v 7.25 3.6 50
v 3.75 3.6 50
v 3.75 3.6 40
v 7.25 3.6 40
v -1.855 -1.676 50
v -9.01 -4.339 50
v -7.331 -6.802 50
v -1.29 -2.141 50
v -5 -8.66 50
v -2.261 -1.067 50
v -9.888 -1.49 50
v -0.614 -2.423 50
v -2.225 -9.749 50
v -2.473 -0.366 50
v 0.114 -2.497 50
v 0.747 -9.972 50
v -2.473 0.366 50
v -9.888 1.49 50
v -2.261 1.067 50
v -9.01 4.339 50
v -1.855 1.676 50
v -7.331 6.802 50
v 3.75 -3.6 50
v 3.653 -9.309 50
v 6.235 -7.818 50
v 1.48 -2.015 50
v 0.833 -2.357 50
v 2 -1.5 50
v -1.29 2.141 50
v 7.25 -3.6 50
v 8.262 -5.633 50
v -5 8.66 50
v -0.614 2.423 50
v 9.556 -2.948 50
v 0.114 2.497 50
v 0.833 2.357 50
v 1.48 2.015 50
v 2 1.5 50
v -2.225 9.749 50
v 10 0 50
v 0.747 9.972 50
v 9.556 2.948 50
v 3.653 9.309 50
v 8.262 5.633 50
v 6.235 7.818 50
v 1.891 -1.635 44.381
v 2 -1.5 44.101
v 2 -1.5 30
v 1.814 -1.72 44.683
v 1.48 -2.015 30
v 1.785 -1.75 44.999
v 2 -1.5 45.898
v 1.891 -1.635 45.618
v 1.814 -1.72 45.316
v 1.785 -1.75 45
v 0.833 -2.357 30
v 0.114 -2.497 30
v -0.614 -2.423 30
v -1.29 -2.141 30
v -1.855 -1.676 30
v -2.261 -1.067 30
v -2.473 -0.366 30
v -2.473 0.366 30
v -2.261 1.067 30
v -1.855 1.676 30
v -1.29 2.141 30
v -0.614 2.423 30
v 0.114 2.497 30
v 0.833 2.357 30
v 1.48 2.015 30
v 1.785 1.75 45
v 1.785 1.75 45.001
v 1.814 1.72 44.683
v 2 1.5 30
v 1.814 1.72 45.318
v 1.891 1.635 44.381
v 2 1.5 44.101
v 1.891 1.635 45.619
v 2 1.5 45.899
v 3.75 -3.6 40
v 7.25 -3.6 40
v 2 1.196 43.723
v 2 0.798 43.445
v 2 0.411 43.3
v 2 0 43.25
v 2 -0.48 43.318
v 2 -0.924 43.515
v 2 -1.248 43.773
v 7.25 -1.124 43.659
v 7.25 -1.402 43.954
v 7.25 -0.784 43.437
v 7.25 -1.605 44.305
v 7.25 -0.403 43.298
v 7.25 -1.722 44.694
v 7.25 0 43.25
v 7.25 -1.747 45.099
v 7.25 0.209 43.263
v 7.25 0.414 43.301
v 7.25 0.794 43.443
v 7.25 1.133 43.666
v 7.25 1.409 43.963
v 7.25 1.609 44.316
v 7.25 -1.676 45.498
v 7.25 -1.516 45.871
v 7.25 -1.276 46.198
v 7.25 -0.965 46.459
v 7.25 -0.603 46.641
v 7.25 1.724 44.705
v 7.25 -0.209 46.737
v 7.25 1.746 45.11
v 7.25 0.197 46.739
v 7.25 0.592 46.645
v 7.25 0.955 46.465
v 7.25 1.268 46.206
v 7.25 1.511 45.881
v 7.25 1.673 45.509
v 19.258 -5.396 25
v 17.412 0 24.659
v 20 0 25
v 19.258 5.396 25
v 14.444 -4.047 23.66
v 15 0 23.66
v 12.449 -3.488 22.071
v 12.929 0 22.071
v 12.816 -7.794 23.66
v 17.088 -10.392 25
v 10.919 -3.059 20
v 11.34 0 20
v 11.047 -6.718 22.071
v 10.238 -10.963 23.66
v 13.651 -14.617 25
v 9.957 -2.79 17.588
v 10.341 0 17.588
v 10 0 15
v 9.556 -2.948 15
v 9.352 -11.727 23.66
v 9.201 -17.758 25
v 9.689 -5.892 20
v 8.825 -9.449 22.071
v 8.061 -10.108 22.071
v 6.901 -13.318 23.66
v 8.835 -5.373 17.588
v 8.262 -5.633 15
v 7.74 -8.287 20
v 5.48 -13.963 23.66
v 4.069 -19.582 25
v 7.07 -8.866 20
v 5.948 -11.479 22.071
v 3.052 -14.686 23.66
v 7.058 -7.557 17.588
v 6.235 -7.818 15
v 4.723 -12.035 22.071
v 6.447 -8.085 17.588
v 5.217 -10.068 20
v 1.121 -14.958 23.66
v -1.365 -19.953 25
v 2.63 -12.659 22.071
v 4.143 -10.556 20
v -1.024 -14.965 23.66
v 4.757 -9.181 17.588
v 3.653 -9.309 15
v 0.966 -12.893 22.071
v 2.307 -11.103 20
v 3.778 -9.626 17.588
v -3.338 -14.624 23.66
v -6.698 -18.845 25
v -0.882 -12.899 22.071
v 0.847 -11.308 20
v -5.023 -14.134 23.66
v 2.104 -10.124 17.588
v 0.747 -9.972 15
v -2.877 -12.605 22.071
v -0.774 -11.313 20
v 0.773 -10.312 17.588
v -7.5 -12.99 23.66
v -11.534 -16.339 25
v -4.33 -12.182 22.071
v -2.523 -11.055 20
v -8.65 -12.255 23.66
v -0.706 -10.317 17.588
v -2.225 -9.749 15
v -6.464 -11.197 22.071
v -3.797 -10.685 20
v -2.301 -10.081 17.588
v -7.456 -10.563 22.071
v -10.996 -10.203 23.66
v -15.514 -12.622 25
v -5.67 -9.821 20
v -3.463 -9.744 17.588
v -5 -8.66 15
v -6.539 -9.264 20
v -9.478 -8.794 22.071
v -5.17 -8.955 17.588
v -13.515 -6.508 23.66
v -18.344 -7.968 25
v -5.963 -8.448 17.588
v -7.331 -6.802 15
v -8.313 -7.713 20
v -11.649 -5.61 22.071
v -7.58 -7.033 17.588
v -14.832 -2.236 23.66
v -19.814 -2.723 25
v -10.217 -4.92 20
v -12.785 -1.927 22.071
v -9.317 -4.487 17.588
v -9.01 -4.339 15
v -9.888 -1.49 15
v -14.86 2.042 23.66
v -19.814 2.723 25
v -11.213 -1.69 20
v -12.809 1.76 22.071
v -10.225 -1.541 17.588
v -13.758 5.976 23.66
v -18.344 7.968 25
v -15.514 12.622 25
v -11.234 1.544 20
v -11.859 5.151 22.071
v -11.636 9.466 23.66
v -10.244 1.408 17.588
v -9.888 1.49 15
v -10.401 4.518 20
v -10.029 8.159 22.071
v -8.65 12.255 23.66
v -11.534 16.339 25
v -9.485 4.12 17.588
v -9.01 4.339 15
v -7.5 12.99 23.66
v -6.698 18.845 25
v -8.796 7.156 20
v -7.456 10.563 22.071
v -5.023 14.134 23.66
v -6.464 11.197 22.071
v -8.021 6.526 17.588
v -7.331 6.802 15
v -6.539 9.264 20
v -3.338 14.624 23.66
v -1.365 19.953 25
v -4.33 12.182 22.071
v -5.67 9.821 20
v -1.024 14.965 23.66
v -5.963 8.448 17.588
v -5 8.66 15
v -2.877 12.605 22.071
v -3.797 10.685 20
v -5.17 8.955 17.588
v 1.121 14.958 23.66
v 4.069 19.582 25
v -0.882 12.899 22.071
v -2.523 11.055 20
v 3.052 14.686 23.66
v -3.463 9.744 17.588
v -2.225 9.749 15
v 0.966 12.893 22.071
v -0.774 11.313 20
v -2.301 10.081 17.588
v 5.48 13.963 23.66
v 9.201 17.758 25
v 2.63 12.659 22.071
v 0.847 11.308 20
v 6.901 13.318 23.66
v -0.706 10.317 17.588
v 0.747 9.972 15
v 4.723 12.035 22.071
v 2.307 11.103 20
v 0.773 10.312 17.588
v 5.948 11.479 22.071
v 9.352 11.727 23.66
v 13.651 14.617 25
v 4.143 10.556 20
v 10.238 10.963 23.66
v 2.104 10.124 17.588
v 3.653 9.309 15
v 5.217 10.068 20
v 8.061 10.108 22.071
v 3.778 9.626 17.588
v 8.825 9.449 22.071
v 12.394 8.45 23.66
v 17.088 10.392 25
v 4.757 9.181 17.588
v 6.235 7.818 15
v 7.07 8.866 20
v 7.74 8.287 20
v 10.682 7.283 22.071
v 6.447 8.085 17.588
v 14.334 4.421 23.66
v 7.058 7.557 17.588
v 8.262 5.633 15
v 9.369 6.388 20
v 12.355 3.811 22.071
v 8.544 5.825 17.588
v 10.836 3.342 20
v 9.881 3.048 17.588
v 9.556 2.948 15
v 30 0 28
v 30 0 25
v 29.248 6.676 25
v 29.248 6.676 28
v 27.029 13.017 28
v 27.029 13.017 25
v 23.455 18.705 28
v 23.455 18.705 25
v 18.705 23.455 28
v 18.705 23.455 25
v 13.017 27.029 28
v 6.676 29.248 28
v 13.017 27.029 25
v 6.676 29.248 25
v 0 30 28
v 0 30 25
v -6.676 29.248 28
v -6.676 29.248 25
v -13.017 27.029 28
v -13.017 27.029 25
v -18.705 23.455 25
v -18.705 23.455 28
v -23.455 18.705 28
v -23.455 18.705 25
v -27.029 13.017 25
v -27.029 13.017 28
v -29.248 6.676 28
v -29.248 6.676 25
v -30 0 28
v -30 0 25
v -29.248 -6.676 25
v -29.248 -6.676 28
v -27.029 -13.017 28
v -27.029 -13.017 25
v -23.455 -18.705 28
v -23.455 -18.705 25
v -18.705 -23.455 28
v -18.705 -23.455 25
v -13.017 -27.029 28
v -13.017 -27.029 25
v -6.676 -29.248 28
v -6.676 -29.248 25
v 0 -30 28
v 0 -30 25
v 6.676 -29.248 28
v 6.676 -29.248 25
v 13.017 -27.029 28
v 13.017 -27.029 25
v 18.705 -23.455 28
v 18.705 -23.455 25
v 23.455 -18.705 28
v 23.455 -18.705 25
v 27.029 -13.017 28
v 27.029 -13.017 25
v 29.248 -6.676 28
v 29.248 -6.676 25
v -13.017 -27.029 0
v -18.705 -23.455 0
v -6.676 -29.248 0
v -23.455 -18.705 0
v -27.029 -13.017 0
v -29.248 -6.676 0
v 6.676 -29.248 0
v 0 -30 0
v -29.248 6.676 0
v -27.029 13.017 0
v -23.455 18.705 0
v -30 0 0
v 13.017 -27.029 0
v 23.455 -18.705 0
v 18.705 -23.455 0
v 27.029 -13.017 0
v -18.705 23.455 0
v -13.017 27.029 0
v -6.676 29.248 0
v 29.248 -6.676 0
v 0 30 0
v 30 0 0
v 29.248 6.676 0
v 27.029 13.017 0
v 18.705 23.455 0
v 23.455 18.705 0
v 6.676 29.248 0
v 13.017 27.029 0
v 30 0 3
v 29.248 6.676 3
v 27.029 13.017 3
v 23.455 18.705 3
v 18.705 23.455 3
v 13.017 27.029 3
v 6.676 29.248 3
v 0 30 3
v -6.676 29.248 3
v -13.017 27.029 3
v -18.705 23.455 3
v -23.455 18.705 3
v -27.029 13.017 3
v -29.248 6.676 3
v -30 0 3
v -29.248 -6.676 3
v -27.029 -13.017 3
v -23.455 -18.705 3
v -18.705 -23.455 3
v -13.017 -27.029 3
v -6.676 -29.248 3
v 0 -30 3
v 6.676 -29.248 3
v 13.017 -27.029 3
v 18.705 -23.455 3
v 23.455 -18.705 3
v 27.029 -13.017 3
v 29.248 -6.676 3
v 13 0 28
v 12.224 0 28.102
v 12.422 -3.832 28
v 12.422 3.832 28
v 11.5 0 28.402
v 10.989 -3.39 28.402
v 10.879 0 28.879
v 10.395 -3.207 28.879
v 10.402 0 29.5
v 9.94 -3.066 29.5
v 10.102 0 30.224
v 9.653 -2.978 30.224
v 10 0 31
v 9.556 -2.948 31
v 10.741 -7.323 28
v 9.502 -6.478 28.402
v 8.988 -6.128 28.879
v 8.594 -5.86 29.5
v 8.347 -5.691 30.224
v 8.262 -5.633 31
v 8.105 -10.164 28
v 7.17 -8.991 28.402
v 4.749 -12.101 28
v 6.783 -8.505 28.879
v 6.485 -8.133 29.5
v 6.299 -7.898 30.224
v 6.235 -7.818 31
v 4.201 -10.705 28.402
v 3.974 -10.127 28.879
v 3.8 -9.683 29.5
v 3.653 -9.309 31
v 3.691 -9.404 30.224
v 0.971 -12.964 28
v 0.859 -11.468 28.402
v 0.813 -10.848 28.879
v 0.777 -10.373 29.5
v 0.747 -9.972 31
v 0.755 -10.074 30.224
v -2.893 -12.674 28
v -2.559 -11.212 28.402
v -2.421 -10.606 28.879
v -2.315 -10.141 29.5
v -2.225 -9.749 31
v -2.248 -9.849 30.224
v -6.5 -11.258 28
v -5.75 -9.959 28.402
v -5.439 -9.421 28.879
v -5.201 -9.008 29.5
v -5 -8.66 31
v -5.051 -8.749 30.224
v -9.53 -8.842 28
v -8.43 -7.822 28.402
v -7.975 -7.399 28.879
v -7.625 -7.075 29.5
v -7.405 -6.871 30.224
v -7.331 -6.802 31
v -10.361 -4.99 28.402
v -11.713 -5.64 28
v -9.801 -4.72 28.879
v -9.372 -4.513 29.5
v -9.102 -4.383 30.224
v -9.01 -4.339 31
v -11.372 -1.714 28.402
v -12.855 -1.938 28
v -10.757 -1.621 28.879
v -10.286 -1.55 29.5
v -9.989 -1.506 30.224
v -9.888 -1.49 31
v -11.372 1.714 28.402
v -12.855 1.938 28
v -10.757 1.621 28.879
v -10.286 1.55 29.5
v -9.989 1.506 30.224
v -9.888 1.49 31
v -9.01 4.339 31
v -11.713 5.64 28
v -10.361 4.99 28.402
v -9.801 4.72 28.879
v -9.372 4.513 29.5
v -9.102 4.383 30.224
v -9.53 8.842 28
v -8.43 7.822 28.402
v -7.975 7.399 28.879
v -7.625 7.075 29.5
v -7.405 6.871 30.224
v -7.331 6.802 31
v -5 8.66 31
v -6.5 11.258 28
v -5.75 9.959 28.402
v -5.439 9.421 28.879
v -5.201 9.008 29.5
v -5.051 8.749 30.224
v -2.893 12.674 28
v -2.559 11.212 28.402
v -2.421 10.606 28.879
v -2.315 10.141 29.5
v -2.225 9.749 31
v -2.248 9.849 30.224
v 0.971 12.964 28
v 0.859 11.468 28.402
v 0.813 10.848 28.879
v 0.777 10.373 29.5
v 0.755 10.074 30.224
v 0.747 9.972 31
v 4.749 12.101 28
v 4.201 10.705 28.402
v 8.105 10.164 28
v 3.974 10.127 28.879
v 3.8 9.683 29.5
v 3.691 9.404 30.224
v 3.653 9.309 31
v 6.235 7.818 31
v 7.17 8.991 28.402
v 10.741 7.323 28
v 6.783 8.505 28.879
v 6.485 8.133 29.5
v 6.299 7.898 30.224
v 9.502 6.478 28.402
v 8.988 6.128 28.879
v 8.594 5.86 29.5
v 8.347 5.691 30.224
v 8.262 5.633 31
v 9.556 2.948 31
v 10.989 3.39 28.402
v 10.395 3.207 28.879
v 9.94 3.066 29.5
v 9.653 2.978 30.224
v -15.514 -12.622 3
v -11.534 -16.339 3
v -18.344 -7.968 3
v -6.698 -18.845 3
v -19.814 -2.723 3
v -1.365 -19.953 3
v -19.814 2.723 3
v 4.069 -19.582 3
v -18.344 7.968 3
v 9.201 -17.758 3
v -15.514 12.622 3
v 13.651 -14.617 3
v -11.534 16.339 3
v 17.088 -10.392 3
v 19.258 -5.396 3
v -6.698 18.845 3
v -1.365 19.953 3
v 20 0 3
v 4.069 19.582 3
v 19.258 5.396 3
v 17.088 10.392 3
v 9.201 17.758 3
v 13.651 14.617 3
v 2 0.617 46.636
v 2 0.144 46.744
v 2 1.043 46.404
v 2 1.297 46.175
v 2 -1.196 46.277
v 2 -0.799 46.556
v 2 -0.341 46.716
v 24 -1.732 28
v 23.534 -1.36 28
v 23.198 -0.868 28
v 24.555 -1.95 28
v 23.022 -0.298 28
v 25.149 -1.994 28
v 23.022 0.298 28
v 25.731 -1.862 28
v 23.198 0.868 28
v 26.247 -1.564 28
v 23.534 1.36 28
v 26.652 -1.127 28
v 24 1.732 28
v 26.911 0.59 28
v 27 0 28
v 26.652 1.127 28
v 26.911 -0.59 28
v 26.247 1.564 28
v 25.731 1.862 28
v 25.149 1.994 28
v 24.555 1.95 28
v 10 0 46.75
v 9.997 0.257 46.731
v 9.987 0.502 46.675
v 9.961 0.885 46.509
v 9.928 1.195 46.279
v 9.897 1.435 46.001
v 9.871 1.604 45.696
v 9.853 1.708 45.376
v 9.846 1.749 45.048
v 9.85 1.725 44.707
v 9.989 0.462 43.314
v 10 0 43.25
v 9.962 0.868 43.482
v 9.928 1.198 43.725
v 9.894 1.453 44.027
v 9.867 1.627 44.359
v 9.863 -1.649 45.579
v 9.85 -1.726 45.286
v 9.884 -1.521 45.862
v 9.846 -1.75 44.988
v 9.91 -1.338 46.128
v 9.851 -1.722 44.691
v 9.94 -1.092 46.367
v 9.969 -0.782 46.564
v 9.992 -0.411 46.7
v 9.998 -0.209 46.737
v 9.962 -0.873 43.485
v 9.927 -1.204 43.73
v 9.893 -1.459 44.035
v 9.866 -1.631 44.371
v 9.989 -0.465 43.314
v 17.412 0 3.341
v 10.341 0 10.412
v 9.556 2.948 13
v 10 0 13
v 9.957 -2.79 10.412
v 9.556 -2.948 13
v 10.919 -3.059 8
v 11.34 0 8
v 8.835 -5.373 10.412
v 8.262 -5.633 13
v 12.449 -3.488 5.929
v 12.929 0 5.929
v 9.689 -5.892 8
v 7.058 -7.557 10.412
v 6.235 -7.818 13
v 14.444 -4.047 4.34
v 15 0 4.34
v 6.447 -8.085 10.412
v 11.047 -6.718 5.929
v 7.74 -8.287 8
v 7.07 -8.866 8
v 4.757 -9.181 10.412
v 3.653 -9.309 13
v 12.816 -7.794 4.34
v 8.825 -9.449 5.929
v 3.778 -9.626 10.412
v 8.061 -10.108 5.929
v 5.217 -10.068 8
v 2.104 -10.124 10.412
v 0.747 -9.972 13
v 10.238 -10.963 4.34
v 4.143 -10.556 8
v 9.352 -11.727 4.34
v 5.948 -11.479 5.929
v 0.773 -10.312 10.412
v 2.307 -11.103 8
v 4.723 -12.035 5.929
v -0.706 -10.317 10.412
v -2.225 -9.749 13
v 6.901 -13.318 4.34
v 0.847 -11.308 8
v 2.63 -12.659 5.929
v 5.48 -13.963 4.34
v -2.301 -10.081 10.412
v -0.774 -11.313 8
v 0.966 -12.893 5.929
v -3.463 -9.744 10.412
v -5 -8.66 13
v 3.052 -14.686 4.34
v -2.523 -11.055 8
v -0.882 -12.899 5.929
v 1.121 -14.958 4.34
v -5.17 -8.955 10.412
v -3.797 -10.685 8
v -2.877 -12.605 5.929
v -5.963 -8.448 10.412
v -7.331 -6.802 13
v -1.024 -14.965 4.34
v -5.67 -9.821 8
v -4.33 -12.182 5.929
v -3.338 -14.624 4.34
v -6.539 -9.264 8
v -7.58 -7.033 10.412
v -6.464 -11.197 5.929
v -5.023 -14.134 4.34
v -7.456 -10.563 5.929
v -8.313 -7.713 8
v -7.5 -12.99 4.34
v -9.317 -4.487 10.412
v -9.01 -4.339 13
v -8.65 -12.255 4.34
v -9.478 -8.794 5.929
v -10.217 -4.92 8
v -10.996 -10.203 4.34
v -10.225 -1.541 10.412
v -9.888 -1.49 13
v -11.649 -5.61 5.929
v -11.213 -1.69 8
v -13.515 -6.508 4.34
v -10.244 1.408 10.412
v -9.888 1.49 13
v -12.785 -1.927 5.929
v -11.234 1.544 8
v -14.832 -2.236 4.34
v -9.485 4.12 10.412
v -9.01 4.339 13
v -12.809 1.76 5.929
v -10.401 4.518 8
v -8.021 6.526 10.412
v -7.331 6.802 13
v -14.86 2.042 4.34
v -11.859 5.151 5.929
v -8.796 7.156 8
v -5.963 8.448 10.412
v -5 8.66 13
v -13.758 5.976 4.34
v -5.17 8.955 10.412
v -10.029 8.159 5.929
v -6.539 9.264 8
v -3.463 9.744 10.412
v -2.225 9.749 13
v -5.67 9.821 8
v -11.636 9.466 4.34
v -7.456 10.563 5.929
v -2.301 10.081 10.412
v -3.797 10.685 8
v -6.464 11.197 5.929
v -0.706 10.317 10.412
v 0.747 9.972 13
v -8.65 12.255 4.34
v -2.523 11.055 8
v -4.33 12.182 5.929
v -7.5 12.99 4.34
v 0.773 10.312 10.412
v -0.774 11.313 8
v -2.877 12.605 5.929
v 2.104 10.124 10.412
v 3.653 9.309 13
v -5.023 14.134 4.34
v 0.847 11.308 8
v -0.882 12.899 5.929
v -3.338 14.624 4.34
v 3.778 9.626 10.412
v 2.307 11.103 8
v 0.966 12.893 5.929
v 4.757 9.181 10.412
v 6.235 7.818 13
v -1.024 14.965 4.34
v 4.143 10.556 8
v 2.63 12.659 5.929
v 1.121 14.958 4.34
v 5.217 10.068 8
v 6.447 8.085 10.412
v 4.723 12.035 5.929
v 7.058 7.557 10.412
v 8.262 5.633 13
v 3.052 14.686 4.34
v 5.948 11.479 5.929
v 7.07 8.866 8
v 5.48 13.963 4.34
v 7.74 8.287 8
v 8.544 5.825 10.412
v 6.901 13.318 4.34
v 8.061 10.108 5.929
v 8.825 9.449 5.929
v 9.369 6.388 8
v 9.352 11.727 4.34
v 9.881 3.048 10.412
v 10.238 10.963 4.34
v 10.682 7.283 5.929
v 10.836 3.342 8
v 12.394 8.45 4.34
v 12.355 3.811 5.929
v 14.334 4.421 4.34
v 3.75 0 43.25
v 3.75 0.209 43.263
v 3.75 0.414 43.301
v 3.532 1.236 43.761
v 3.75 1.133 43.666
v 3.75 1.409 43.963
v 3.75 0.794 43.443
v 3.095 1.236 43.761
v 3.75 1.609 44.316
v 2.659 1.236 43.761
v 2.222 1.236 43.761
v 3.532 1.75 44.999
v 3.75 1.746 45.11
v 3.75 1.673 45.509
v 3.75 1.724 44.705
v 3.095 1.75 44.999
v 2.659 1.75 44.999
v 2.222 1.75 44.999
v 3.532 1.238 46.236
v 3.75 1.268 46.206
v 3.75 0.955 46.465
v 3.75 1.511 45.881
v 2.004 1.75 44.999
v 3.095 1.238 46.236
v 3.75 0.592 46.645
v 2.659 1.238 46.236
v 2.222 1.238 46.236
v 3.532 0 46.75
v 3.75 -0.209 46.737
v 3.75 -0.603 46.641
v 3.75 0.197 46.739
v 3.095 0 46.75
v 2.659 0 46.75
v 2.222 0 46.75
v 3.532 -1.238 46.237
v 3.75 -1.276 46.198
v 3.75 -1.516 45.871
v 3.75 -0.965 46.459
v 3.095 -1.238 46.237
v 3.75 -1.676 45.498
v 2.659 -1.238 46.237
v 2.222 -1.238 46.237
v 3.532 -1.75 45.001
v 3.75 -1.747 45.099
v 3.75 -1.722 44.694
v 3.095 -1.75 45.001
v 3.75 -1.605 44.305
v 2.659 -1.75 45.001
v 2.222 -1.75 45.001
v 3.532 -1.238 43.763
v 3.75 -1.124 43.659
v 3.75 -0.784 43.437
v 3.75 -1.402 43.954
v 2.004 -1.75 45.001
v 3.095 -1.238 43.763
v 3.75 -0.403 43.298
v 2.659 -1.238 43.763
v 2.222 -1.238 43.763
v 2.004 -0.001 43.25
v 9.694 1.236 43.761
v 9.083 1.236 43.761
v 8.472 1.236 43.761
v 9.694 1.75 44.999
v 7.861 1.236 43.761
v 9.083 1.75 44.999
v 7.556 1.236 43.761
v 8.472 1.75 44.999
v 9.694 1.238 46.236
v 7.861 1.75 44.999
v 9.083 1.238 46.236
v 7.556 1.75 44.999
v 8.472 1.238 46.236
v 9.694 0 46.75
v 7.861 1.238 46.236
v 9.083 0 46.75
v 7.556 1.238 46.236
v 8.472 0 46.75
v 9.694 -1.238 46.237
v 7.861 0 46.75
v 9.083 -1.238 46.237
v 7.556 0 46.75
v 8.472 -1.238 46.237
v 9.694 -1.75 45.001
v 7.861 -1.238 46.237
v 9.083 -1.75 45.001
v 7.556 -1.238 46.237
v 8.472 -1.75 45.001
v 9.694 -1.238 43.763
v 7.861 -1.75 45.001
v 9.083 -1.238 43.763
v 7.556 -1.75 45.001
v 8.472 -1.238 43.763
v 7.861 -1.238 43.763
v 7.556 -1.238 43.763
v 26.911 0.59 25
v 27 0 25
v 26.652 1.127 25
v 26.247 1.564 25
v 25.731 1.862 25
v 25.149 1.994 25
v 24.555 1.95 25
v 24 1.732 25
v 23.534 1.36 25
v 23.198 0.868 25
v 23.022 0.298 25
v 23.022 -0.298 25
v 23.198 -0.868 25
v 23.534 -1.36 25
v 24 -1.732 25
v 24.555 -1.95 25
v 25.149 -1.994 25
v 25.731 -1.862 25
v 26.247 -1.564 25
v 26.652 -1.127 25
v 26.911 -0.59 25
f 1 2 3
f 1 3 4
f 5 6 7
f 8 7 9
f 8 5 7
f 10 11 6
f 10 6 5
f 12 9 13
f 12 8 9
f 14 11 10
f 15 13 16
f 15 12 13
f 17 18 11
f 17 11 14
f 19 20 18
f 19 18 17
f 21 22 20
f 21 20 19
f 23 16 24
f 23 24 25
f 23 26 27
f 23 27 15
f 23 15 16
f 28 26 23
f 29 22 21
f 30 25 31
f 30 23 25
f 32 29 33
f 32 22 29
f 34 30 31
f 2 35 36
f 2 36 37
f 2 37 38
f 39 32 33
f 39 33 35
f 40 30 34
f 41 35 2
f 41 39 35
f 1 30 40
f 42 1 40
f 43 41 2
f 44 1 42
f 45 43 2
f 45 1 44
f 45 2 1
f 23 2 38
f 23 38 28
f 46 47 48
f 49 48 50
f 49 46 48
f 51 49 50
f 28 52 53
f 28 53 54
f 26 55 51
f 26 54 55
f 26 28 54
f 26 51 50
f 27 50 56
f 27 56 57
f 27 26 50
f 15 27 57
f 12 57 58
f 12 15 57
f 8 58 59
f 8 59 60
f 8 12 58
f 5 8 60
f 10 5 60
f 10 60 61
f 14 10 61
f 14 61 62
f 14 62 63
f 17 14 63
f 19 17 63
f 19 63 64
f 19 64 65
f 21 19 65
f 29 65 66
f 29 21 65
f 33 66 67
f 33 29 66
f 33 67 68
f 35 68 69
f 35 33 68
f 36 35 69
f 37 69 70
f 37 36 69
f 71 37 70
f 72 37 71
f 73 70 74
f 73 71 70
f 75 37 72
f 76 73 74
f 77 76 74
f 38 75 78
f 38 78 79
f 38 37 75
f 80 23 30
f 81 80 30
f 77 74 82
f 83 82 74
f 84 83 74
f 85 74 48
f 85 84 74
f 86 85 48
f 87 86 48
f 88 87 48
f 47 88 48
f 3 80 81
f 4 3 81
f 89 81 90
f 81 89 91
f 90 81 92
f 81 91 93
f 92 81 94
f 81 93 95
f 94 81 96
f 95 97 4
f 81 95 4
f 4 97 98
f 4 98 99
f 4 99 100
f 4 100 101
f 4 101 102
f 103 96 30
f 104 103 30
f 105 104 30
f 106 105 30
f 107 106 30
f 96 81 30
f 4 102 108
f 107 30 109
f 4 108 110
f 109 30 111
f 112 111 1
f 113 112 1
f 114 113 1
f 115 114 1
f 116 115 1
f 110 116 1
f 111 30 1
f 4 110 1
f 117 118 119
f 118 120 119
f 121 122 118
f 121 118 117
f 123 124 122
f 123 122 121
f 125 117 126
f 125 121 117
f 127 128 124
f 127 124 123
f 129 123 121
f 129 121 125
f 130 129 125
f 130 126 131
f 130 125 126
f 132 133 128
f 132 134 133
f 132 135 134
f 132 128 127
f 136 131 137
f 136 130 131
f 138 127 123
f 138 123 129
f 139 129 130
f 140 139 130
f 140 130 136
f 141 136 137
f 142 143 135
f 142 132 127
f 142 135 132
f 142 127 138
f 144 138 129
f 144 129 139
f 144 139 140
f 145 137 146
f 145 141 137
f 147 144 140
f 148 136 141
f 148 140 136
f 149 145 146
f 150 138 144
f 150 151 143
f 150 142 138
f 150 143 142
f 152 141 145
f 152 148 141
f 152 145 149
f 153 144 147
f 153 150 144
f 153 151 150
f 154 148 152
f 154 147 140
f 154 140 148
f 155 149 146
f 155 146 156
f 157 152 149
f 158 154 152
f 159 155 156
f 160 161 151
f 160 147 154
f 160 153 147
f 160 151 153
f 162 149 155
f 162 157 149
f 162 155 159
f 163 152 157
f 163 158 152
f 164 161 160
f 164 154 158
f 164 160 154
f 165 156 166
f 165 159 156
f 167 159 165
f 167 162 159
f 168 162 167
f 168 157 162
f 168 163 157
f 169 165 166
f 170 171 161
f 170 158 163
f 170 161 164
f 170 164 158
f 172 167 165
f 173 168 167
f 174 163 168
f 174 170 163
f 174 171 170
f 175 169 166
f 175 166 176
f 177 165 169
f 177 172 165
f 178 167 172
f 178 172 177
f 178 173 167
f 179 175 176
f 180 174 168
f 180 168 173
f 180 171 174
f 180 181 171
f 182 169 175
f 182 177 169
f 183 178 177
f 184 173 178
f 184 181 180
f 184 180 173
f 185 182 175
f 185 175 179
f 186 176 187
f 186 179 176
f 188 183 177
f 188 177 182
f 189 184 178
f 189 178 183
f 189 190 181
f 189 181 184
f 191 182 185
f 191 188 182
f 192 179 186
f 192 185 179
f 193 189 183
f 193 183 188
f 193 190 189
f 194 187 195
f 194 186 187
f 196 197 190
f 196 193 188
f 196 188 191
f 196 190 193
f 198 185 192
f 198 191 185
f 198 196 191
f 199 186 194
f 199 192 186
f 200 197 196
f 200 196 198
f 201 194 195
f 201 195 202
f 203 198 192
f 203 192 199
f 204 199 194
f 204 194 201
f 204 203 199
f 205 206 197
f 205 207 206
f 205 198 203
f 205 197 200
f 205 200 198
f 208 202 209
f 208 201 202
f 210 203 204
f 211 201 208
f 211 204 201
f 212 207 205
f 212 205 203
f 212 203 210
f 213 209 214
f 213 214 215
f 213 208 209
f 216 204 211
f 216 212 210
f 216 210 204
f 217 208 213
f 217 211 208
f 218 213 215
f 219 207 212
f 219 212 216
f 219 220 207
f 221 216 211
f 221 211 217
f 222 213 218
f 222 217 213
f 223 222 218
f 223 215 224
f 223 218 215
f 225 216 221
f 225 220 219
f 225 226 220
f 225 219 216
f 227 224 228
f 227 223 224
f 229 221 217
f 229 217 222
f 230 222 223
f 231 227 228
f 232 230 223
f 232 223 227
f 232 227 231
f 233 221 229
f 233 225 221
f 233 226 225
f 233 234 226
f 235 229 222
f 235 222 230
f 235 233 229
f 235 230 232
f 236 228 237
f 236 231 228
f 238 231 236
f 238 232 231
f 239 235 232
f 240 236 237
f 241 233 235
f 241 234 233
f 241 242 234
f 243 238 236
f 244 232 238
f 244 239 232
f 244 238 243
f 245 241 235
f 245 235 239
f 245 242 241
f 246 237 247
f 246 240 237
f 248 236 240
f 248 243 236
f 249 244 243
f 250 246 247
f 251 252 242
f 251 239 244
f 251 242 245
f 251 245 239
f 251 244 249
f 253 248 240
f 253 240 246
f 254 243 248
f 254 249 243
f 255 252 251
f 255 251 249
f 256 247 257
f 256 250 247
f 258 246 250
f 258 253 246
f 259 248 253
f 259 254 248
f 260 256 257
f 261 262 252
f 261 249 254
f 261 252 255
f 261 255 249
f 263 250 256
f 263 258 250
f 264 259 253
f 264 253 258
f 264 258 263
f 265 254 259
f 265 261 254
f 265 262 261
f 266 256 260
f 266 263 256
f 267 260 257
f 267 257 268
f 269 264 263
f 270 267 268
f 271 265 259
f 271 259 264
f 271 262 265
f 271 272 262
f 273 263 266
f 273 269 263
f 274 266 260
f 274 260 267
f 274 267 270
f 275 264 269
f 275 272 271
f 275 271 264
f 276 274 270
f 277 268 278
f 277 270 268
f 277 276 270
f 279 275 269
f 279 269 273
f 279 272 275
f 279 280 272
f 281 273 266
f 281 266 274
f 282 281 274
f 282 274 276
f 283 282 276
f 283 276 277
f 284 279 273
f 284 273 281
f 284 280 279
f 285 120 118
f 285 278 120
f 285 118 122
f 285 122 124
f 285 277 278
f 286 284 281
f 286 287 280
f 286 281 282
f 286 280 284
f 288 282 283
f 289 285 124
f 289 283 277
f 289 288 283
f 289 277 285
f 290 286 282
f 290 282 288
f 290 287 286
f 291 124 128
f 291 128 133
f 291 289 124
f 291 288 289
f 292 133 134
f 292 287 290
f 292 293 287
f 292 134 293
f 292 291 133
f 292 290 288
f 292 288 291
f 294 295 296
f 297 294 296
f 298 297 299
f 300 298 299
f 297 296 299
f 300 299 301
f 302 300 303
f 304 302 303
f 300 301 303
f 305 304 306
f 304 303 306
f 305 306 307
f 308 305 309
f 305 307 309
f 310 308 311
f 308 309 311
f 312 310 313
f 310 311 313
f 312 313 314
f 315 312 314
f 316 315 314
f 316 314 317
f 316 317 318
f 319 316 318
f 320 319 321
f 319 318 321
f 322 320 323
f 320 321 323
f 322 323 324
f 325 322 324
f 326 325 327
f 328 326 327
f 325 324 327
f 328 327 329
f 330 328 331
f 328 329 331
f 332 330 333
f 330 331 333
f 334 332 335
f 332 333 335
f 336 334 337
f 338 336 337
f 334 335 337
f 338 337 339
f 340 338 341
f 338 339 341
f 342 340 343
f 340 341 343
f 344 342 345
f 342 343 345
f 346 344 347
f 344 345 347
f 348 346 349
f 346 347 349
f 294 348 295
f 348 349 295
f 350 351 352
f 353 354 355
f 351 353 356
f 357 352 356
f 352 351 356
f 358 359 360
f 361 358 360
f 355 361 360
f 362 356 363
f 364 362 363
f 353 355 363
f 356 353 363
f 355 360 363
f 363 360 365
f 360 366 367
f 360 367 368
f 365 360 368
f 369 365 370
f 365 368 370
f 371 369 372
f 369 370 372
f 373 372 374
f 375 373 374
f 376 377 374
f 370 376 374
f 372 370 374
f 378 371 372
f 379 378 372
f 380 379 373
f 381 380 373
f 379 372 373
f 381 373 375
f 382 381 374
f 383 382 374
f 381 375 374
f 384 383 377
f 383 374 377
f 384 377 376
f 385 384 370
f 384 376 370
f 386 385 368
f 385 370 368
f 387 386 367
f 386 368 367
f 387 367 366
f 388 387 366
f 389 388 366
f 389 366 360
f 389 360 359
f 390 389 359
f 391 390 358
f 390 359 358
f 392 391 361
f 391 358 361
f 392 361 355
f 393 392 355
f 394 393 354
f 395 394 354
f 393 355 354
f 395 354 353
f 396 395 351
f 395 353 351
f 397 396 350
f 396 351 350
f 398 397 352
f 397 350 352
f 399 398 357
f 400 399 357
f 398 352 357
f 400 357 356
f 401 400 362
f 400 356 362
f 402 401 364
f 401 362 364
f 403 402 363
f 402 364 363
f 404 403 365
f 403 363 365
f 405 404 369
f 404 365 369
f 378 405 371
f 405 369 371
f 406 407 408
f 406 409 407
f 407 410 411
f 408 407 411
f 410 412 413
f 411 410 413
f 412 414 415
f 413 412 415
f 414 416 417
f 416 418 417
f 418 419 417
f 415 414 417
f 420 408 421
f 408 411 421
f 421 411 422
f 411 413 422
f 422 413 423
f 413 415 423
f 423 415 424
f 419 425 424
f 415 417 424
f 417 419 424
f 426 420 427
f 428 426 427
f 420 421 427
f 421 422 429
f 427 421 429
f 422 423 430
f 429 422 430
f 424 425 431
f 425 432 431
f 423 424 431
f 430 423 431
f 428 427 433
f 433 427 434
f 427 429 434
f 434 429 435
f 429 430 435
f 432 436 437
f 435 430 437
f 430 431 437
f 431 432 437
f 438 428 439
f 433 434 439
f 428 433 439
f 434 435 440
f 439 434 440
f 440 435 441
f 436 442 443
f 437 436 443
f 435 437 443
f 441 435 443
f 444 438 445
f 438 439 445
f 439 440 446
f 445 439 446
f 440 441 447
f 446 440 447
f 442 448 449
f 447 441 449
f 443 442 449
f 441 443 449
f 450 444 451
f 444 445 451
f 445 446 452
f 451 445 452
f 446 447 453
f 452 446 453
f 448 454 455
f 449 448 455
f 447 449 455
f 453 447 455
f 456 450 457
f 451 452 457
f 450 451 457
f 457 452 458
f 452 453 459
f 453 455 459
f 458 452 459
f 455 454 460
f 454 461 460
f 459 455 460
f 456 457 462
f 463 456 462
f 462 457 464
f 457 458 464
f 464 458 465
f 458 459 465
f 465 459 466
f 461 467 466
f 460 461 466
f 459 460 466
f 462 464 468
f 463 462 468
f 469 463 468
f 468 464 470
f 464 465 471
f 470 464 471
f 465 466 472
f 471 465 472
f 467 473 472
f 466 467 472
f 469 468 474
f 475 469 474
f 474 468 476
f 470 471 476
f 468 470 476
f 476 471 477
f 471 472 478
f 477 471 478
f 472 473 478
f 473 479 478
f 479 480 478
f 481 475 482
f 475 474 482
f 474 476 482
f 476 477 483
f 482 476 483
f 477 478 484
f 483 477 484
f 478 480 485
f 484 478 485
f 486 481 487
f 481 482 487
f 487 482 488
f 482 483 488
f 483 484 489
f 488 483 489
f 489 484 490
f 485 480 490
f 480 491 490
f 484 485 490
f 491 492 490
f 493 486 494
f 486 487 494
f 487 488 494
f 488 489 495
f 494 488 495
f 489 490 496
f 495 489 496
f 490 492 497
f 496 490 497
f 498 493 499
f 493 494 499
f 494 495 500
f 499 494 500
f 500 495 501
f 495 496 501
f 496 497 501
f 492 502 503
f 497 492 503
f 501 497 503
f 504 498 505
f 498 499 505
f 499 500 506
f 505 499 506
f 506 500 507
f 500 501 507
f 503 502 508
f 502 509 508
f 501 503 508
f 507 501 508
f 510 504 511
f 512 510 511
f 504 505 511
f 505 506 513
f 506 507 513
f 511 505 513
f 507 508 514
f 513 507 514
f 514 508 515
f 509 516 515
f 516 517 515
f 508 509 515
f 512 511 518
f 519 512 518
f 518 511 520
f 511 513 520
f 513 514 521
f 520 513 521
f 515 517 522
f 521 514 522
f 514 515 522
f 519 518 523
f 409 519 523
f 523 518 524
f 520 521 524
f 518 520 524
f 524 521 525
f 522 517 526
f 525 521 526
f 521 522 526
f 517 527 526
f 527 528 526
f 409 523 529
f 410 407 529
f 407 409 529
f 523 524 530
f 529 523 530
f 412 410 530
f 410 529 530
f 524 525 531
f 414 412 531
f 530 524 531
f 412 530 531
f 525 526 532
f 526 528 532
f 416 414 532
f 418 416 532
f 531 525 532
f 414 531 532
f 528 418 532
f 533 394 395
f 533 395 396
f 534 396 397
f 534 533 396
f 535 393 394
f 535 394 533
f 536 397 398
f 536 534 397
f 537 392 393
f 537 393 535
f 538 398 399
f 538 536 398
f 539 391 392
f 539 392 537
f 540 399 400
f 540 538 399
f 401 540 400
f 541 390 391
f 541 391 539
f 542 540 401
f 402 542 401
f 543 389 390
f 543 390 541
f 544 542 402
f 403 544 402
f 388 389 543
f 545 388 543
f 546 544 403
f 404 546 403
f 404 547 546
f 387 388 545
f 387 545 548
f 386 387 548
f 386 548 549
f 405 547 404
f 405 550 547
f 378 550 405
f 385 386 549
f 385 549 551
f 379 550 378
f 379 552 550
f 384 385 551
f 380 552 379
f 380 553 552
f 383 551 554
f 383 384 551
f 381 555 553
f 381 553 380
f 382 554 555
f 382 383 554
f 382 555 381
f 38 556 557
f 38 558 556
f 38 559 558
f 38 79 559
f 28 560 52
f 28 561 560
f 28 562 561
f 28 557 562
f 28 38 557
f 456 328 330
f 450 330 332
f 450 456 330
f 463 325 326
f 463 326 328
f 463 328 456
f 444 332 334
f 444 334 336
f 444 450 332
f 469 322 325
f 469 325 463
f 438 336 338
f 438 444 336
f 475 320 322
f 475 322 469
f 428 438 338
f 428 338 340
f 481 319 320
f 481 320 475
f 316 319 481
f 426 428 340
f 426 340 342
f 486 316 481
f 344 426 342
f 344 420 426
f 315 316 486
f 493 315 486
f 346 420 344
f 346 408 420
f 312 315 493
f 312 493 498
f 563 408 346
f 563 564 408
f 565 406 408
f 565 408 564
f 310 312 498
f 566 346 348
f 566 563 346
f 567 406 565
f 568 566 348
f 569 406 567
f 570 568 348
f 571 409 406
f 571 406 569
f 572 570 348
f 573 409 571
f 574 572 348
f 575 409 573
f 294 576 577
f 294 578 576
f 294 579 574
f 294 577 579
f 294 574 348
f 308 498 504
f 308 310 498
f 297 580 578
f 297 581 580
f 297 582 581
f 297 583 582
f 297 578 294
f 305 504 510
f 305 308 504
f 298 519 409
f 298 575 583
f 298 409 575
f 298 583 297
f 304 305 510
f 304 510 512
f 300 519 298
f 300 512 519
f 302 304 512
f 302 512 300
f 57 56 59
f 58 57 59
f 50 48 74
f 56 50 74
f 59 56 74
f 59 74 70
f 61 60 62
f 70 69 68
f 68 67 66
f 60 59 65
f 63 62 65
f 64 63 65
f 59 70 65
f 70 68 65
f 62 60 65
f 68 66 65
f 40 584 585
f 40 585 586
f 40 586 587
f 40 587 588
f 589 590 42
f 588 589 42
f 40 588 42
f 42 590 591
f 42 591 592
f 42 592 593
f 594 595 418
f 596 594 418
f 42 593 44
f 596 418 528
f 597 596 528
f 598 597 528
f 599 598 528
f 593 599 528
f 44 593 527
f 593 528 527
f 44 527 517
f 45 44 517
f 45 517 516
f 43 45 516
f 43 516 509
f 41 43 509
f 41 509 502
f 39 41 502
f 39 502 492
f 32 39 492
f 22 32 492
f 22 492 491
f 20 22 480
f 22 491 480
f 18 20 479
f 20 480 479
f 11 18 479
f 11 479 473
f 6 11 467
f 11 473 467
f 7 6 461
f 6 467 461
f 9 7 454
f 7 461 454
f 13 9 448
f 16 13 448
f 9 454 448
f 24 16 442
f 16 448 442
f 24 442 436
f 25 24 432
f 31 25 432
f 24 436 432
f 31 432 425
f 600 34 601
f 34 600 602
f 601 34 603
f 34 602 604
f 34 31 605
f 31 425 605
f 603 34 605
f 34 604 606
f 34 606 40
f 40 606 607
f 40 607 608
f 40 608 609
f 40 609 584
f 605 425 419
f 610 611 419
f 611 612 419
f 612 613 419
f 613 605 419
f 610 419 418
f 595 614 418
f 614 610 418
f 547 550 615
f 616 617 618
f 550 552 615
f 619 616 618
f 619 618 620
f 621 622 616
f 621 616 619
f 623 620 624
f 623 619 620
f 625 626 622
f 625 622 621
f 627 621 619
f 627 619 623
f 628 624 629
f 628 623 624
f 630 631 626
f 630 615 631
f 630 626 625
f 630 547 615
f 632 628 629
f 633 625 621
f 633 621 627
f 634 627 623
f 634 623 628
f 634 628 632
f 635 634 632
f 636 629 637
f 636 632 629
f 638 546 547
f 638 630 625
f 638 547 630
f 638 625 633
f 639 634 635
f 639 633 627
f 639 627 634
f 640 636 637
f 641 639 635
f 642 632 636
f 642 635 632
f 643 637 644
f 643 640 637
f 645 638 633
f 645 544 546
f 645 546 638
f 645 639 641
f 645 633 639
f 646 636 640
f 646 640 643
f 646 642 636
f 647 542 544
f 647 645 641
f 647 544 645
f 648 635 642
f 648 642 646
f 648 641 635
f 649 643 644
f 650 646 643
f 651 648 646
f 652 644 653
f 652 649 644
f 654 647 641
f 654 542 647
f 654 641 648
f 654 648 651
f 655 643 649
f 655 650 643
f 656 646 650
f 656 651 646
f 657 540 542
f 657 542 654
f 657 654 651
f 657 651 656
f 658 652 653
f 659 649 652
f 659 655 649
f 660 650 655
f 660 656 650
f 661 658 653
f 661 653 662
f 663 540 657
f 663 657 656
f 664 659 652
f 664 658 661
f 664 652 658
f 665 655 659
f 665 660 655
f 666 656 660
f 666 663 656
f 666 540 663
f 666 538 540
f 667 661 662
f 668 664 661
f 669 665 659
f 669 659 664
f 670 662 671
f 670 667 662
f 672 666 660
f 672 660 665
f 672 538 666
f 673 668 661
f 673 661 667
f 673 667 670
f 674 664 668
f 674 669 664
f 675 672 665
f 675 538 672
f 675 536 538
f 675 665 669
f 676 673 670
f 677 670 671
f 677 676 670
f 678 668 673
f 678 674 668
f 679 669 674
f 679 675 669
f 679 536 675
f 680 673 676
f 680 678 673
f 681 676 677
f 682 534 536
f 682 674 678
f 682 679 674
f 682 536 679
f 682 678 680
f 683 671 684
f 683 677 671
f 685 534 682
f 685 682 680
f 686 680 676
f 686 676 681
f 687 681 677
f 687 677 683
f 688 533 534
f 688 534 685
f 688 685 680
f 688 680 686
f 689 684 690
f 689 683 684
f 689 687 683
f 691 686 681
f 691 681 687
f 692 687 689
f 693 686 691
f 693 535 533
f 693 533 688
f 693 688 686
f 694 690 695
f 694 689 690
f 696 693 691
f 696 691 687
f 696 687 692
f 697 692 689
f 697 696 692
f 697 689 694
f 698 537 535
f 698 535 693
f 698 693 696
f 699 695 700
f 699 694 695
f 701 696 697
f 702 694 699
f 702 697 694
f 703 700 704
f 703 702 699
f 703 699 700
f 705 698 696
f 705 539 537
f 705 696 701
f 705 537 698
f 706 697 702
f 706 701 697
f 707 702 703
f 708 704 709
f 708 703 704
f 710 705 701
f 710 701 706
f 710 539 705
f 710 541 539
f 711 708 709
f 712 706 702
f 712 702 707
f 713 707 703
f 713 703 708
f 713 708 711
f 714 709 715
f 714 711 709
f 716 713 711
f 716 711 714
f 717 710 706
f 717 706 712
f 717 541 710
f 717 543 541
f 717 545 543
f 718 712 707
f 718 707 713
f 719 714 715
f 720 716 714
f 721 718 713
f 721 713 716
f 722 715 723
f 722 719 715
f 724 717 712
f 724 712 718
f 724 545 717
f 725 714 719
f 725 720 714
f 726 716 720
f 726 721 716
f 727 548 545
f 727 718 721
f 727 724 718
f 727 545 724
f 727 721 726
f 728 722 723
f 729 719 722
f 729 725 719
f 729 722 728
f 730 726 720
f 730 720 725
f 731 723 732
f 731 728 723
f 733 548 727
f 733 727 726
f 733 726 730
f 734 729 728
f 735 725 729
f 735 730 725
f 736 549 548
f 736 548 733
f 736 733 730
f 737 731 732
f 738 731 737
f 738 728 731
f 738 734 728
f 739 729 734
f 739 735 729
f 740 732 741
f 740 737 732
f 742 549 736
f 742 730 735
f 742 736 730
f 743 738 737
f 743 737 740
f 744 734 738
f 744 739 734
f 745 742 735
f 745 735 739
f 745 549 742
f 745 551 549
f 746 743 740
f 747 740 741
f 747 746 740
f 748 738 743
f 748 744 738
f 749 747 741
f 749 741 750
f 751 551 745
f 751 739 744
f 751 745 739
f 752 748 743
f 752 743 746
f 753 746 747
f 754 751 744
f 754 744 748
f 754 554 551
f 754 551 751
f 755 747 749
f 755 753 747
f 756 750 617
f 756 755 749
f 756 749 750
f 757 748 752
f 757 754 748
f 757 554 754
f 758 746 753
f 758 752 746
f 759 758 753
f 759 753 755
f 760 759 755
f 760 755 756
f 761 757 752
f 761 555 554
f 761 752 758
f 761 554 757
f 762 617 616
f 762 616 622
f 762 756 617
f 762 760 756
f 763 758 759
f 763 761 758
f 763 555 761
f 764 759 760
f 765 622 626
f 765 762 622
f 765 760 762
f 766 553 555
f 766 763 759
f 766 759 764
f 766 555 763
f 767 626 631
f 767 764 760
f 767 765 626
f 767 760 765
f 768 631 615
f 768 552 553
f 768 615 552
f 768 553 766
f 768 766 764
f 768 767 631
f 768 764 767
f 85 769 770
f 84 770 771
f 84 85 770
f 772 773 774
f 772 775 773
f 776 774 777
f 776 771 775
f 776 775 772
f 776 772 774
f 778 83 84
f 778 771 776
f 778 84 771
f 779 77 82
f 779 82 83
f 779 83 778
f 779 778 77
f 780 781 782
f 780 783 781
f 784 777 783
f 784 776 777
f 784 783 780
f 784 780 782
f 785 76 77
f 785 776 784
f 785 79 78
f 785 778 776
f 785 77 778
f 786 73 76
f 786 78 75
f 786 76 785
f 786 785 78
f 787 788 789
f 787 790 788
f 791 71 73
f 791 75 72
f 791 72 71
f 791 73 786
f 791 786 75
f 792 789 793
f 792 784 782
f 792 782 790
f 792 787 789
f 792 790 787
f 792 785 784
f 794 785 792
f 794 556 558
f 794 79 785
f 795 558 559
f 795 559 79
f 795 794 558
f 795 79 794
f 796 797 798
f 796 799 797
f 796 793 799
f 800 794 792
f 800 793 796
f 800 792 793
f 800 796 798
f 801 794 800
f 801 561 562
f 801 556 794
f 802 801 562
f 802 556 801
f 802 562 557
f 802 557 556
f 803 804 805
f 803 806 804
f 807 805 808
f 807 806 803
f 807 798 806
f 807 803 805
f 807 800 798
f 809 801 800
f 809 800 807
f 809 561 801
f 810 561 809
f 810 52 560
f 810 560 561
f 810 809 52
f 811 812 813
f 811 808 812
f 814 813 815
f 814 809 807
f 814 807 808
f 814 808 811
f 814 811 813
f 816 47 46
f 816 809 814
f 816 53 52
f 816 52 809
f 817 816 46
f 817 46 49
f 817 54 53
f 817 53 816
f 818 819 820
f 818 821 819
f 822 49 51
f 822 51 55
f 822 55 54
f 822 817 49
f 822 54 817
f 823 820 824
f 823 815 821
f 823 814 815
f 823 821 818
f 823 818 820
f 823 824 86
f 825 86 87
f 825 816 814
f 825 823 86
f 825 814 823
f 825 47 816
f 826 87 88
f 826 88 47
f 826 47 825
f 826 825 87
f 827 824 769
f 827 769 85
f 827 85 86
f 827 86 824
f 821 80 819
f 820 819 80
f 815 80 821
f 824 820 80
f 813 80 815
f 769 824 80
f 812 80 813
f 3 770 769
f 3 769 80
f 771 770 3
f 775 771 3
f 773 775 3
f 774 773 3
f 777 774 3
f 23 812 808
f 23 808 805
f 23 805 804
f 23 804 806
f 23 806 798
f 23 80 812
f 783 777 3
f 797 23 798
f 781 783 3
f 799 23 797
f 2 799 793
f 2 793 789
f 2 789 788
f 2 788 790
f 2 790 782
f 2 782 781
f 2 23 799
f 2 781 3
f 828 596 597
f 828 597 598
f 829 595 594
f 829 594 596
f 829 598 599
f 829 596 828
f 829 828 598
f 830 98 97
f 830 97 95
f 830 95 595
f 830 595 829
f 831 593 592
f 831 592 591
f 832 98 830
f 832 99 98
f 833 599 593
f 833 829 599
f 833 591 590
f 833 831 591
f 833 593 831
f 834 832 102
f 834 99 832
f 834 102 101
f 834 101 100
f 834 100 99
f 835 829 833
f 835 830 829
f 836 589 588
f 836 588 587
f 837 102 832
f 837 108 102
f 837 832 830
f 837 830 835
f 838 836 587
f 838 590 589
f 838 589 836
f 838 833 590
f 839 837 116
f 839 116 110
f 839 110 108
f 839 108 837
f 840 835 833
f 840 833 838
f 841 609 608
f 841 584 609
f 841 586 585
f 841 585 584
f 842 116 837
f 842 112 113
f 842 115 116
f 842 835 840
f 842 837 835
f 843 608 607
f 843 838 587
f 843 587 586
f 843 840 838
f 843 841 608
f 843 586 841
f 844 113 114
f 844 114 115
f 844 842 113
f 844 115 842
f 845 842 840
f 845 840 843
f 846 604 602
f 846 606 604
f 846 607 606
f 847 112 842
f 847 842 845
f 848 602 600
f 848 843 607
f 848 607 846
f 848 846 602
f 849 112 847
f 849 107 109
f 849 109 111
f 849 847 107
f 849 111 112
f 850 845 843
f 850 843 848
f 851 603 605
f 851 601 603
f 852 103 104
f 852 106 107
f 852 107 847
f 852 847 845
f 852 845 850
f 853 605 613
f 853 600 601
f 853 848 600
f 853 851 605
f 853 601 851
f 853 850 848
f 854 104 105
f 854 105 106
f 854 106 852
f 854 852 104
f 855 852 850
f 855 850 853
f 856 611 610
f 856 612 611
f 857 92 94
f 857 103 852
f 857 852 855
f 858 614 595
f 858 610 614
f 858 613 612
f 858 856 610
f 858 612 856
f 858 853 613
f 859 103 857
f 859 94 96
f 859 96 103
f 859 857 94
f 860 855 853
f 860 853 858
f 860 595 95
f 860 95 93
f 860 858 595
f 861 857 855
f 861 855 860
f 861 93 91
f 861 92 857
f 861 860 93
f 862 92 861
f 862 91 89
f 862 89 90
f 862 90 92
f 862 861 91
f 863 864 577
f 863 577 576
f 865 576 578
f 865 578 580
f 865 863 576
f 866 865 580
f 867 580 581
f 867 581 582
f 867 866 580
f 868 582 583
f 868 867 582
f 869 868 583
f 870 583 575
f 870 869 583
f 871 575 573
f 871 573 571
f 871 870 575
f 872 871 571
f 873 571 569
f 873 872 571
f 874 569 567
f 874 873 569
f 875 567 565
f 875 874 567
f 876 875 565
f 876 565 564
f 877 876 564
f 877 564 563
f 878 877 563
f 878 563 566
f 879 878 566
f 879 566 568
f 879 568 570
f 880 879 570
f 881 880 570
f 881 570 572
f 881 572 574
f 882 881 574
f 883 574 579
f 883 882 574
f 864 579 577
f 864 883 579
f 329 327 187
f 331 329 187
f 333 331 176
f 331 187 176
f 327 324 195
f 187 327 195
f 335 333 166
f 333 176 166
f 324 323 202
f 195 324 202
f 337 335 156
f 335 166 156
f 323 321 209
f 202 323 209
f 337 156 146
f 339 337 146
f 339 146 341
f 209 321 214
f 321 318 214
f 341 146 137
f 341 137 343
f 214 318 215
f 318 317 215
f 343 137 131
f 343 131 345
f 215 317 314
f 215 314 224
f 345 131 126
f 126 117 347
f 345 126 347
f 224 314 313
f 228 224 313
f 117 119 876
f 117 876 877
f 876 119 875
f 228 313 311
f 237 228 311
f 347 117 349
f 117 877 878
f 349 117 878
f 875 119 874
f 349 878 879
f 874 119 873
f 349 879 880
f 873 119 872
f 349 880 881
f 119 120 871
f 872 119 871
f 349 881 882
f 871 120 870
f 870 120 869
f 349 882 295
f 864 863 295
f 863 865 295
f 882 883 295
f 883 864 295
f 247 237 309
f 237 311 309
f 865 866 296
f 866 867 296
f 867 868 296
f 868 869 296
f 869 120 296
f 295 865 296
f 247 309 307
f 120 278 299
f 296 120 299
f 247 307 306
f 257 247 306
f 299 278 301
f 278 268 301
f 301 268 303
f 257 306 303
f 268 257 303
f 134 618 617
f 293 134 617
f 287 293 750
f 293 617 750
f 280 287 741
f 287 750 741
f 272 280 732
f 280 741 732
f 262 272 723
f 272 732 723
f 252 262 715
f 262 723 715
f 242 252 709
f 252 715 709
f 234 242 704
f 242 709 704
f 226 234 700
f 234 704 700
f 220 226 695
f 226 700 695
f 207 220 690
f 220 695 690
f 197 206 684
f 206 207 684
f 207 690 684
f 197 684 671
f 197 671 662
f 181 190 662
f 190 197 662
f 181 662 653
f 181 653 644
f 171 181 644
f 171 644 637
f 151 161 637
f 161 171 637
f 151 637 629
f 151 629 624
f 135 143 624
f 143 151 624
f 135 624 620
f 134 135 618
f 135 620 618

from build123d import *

# Parameters (mm, degrees)
CROQUIS1_R              = 10
SALIENTE_EXTRUIR2_DEPTH = 50
CROQUIS4_R              = 30
SALIENTE_EXTRUIR3_DEPTH = 3
SALIENTE_EXTRUIR4_START = 25
CROQUIS5_R              = 30
SALIENTE_EXTRUIR4_DEPTH = 3
REDONDEO2_R             = 10
CORTAR_EXTRUIR1_START   = 50
CORTAR_EXTRUIR1_DEPTH   = 20
CORTAR_EXTRUIR2_START   = 50
CROQUIS7_W              = 3.5
CROQUIS7_H              = 7.2
CORTAR_EXTRUIR2_DEPTH   = 10
CORTAR_EXTRUIR3_START   = 1.785357468
CORTAR_EXTRUIR3_DEPTH   = 8.214642632
CORTAR_EXTRUIR4_START   = 25
CROQUIS9_R              = 2
CORTAR_EXTRUIR4_DEPTH   = 3
REDONDEO3_R             = 3


# Read off the part's stored shape, not the designer's step: Cortar-Extruir3
with BuildPart() as part:
    # Croquis1 → Saliente-Extruir2 (new body)
    with BuildSketch(Plane.XY):
        Circle(CROQUIS1_R)
    extrude(amount=SALIENTE_EXTRUIR2_DEPTH)

    # Croquis4 → Saliente-Extruir3 (add)
    with BuildSketch(Plane.XY):
        Circle(CROQUIS4_R)
    extrude(amount=SALIENTE_EXTRUIR3_DEPTH)

    # Croquis5 → Saliente-Extruir4 (add)
    with BuildSketch(Plane.XY.offset(SALIENTE_EXTRUIR4_START)):
        Circle(CROQUIS5_R)
    extrude(amount=SALIENTE_EXTRUIR4_DEPTH)

    # Redondeo2
    redondeo2_edges = [part.edges().sort_by_distance(p)[0] for p in [
        (-10, 0, 25),
        (-10, 0, 3),
    ]]
    fillet(redondeo2_edges, radius=REDONDEO2_R)

    # Croquis6 → Cortar-Extruir1 (cut)
    with BuildSketch(Plane.XY.offset(CORTAR_EXTRUIR1_START)):
        with BuildLine():
            Line((2, 1.5), (2, -1.5))
            ThreePointArc((2, -1.5), (-2.5, 0), (2, 1.5))
        make_face()
    extrude(amount=-CORTAR_EXTRUIR1_DEPTH, mode=Mode.SUBTRACT)

    # Croquis7 → Cortar-Extruir2 (cut)
    with BuildSketch(Plane.XY.offset(CORTAR_EXTRUIR2_START)):
        with Locations((5.5, 0)):
            Rectangle(CROQUIS7_W, CROQUIS7_H)
    extrude(amount=-CORTAR_EXTRUIR2_DEPTH, mode=Mode.SUBTRACT)

    # Cortar-Extruir3 outline → Cortar-Extruir3 (cut)
    with BuildSketch(Plane(origin=(0, 0, 0), x_dir=(0, 0, -1), z_dir=(1, 0, 0)).offset(CORTAR_EXTRUIR3_START)):
        with BuildLine():
            add(Edge.make_bspline(
                [(-43.250000008, 0), (-43.250010298, 0.457042806), (-43.439269311, 0.91355666), (-44.08377392, 1.559232298), (-44.536167579, 1.749638189), (-45.461098225, 1.750360744), (-45.914256169, 1.560125471), (-46.558728463, 0.916635921), (-46.75, 0.463408547), (-46.75, -0.463408547), (-46.559497121, -0.915462774), (-45.915045576, -1.559741953), (-45.458501244, -1.749734355), (-44.543528816, -1.750265056), (-44.088756623, -1.563446648), (-43.437067231, -0.912124478), (-43.250180582, -0.457964068), (-43.250000045, -0.000460382), (-43.250000003, -0.000230191), (-43.250000008, 0)],
                knots=[0.500062925, 0.500062925, 0.500062925, 0.500062925, 0.625, 0.625, 0.750000001, 0.750000001, 0.875000002, 0.875000002, 1.000000004, 1.000000004, 1.125000006, 1.125000006, 1.250000009, 1.250000009, 1.375000013, 1.375000013, 1.500000015, 1.500000015, 1.50006294, 1.50006294, 1.50006294, 1.50006294], degree=3))
        make_face()
    extrude(amount=CORTAR_EXTRUIR3_DEPTH, mode=Mode.SUBTRACT)

    # Croquis9 → Cortar-Extruir4 (cut)
    with BuildSketch(Plane.XY.offset(CORTAR_EXTRUIR4_START)):
        with Locations((25, 0)):
            Circle(CROQUIS9_R)
    extrude(amount=CORTAR_EXTRUIR4_DEPTH, mode=Mode.SUBTRACT)

    # Redondeo3
    redondeo3_edges = [part.edges().sort_by_distance(p)[0] for p in [
        (-10, 0, 28),
    ]]
    fillet(redondeo3_edges, radius=REDONDEO3_R)


solid = part.part
